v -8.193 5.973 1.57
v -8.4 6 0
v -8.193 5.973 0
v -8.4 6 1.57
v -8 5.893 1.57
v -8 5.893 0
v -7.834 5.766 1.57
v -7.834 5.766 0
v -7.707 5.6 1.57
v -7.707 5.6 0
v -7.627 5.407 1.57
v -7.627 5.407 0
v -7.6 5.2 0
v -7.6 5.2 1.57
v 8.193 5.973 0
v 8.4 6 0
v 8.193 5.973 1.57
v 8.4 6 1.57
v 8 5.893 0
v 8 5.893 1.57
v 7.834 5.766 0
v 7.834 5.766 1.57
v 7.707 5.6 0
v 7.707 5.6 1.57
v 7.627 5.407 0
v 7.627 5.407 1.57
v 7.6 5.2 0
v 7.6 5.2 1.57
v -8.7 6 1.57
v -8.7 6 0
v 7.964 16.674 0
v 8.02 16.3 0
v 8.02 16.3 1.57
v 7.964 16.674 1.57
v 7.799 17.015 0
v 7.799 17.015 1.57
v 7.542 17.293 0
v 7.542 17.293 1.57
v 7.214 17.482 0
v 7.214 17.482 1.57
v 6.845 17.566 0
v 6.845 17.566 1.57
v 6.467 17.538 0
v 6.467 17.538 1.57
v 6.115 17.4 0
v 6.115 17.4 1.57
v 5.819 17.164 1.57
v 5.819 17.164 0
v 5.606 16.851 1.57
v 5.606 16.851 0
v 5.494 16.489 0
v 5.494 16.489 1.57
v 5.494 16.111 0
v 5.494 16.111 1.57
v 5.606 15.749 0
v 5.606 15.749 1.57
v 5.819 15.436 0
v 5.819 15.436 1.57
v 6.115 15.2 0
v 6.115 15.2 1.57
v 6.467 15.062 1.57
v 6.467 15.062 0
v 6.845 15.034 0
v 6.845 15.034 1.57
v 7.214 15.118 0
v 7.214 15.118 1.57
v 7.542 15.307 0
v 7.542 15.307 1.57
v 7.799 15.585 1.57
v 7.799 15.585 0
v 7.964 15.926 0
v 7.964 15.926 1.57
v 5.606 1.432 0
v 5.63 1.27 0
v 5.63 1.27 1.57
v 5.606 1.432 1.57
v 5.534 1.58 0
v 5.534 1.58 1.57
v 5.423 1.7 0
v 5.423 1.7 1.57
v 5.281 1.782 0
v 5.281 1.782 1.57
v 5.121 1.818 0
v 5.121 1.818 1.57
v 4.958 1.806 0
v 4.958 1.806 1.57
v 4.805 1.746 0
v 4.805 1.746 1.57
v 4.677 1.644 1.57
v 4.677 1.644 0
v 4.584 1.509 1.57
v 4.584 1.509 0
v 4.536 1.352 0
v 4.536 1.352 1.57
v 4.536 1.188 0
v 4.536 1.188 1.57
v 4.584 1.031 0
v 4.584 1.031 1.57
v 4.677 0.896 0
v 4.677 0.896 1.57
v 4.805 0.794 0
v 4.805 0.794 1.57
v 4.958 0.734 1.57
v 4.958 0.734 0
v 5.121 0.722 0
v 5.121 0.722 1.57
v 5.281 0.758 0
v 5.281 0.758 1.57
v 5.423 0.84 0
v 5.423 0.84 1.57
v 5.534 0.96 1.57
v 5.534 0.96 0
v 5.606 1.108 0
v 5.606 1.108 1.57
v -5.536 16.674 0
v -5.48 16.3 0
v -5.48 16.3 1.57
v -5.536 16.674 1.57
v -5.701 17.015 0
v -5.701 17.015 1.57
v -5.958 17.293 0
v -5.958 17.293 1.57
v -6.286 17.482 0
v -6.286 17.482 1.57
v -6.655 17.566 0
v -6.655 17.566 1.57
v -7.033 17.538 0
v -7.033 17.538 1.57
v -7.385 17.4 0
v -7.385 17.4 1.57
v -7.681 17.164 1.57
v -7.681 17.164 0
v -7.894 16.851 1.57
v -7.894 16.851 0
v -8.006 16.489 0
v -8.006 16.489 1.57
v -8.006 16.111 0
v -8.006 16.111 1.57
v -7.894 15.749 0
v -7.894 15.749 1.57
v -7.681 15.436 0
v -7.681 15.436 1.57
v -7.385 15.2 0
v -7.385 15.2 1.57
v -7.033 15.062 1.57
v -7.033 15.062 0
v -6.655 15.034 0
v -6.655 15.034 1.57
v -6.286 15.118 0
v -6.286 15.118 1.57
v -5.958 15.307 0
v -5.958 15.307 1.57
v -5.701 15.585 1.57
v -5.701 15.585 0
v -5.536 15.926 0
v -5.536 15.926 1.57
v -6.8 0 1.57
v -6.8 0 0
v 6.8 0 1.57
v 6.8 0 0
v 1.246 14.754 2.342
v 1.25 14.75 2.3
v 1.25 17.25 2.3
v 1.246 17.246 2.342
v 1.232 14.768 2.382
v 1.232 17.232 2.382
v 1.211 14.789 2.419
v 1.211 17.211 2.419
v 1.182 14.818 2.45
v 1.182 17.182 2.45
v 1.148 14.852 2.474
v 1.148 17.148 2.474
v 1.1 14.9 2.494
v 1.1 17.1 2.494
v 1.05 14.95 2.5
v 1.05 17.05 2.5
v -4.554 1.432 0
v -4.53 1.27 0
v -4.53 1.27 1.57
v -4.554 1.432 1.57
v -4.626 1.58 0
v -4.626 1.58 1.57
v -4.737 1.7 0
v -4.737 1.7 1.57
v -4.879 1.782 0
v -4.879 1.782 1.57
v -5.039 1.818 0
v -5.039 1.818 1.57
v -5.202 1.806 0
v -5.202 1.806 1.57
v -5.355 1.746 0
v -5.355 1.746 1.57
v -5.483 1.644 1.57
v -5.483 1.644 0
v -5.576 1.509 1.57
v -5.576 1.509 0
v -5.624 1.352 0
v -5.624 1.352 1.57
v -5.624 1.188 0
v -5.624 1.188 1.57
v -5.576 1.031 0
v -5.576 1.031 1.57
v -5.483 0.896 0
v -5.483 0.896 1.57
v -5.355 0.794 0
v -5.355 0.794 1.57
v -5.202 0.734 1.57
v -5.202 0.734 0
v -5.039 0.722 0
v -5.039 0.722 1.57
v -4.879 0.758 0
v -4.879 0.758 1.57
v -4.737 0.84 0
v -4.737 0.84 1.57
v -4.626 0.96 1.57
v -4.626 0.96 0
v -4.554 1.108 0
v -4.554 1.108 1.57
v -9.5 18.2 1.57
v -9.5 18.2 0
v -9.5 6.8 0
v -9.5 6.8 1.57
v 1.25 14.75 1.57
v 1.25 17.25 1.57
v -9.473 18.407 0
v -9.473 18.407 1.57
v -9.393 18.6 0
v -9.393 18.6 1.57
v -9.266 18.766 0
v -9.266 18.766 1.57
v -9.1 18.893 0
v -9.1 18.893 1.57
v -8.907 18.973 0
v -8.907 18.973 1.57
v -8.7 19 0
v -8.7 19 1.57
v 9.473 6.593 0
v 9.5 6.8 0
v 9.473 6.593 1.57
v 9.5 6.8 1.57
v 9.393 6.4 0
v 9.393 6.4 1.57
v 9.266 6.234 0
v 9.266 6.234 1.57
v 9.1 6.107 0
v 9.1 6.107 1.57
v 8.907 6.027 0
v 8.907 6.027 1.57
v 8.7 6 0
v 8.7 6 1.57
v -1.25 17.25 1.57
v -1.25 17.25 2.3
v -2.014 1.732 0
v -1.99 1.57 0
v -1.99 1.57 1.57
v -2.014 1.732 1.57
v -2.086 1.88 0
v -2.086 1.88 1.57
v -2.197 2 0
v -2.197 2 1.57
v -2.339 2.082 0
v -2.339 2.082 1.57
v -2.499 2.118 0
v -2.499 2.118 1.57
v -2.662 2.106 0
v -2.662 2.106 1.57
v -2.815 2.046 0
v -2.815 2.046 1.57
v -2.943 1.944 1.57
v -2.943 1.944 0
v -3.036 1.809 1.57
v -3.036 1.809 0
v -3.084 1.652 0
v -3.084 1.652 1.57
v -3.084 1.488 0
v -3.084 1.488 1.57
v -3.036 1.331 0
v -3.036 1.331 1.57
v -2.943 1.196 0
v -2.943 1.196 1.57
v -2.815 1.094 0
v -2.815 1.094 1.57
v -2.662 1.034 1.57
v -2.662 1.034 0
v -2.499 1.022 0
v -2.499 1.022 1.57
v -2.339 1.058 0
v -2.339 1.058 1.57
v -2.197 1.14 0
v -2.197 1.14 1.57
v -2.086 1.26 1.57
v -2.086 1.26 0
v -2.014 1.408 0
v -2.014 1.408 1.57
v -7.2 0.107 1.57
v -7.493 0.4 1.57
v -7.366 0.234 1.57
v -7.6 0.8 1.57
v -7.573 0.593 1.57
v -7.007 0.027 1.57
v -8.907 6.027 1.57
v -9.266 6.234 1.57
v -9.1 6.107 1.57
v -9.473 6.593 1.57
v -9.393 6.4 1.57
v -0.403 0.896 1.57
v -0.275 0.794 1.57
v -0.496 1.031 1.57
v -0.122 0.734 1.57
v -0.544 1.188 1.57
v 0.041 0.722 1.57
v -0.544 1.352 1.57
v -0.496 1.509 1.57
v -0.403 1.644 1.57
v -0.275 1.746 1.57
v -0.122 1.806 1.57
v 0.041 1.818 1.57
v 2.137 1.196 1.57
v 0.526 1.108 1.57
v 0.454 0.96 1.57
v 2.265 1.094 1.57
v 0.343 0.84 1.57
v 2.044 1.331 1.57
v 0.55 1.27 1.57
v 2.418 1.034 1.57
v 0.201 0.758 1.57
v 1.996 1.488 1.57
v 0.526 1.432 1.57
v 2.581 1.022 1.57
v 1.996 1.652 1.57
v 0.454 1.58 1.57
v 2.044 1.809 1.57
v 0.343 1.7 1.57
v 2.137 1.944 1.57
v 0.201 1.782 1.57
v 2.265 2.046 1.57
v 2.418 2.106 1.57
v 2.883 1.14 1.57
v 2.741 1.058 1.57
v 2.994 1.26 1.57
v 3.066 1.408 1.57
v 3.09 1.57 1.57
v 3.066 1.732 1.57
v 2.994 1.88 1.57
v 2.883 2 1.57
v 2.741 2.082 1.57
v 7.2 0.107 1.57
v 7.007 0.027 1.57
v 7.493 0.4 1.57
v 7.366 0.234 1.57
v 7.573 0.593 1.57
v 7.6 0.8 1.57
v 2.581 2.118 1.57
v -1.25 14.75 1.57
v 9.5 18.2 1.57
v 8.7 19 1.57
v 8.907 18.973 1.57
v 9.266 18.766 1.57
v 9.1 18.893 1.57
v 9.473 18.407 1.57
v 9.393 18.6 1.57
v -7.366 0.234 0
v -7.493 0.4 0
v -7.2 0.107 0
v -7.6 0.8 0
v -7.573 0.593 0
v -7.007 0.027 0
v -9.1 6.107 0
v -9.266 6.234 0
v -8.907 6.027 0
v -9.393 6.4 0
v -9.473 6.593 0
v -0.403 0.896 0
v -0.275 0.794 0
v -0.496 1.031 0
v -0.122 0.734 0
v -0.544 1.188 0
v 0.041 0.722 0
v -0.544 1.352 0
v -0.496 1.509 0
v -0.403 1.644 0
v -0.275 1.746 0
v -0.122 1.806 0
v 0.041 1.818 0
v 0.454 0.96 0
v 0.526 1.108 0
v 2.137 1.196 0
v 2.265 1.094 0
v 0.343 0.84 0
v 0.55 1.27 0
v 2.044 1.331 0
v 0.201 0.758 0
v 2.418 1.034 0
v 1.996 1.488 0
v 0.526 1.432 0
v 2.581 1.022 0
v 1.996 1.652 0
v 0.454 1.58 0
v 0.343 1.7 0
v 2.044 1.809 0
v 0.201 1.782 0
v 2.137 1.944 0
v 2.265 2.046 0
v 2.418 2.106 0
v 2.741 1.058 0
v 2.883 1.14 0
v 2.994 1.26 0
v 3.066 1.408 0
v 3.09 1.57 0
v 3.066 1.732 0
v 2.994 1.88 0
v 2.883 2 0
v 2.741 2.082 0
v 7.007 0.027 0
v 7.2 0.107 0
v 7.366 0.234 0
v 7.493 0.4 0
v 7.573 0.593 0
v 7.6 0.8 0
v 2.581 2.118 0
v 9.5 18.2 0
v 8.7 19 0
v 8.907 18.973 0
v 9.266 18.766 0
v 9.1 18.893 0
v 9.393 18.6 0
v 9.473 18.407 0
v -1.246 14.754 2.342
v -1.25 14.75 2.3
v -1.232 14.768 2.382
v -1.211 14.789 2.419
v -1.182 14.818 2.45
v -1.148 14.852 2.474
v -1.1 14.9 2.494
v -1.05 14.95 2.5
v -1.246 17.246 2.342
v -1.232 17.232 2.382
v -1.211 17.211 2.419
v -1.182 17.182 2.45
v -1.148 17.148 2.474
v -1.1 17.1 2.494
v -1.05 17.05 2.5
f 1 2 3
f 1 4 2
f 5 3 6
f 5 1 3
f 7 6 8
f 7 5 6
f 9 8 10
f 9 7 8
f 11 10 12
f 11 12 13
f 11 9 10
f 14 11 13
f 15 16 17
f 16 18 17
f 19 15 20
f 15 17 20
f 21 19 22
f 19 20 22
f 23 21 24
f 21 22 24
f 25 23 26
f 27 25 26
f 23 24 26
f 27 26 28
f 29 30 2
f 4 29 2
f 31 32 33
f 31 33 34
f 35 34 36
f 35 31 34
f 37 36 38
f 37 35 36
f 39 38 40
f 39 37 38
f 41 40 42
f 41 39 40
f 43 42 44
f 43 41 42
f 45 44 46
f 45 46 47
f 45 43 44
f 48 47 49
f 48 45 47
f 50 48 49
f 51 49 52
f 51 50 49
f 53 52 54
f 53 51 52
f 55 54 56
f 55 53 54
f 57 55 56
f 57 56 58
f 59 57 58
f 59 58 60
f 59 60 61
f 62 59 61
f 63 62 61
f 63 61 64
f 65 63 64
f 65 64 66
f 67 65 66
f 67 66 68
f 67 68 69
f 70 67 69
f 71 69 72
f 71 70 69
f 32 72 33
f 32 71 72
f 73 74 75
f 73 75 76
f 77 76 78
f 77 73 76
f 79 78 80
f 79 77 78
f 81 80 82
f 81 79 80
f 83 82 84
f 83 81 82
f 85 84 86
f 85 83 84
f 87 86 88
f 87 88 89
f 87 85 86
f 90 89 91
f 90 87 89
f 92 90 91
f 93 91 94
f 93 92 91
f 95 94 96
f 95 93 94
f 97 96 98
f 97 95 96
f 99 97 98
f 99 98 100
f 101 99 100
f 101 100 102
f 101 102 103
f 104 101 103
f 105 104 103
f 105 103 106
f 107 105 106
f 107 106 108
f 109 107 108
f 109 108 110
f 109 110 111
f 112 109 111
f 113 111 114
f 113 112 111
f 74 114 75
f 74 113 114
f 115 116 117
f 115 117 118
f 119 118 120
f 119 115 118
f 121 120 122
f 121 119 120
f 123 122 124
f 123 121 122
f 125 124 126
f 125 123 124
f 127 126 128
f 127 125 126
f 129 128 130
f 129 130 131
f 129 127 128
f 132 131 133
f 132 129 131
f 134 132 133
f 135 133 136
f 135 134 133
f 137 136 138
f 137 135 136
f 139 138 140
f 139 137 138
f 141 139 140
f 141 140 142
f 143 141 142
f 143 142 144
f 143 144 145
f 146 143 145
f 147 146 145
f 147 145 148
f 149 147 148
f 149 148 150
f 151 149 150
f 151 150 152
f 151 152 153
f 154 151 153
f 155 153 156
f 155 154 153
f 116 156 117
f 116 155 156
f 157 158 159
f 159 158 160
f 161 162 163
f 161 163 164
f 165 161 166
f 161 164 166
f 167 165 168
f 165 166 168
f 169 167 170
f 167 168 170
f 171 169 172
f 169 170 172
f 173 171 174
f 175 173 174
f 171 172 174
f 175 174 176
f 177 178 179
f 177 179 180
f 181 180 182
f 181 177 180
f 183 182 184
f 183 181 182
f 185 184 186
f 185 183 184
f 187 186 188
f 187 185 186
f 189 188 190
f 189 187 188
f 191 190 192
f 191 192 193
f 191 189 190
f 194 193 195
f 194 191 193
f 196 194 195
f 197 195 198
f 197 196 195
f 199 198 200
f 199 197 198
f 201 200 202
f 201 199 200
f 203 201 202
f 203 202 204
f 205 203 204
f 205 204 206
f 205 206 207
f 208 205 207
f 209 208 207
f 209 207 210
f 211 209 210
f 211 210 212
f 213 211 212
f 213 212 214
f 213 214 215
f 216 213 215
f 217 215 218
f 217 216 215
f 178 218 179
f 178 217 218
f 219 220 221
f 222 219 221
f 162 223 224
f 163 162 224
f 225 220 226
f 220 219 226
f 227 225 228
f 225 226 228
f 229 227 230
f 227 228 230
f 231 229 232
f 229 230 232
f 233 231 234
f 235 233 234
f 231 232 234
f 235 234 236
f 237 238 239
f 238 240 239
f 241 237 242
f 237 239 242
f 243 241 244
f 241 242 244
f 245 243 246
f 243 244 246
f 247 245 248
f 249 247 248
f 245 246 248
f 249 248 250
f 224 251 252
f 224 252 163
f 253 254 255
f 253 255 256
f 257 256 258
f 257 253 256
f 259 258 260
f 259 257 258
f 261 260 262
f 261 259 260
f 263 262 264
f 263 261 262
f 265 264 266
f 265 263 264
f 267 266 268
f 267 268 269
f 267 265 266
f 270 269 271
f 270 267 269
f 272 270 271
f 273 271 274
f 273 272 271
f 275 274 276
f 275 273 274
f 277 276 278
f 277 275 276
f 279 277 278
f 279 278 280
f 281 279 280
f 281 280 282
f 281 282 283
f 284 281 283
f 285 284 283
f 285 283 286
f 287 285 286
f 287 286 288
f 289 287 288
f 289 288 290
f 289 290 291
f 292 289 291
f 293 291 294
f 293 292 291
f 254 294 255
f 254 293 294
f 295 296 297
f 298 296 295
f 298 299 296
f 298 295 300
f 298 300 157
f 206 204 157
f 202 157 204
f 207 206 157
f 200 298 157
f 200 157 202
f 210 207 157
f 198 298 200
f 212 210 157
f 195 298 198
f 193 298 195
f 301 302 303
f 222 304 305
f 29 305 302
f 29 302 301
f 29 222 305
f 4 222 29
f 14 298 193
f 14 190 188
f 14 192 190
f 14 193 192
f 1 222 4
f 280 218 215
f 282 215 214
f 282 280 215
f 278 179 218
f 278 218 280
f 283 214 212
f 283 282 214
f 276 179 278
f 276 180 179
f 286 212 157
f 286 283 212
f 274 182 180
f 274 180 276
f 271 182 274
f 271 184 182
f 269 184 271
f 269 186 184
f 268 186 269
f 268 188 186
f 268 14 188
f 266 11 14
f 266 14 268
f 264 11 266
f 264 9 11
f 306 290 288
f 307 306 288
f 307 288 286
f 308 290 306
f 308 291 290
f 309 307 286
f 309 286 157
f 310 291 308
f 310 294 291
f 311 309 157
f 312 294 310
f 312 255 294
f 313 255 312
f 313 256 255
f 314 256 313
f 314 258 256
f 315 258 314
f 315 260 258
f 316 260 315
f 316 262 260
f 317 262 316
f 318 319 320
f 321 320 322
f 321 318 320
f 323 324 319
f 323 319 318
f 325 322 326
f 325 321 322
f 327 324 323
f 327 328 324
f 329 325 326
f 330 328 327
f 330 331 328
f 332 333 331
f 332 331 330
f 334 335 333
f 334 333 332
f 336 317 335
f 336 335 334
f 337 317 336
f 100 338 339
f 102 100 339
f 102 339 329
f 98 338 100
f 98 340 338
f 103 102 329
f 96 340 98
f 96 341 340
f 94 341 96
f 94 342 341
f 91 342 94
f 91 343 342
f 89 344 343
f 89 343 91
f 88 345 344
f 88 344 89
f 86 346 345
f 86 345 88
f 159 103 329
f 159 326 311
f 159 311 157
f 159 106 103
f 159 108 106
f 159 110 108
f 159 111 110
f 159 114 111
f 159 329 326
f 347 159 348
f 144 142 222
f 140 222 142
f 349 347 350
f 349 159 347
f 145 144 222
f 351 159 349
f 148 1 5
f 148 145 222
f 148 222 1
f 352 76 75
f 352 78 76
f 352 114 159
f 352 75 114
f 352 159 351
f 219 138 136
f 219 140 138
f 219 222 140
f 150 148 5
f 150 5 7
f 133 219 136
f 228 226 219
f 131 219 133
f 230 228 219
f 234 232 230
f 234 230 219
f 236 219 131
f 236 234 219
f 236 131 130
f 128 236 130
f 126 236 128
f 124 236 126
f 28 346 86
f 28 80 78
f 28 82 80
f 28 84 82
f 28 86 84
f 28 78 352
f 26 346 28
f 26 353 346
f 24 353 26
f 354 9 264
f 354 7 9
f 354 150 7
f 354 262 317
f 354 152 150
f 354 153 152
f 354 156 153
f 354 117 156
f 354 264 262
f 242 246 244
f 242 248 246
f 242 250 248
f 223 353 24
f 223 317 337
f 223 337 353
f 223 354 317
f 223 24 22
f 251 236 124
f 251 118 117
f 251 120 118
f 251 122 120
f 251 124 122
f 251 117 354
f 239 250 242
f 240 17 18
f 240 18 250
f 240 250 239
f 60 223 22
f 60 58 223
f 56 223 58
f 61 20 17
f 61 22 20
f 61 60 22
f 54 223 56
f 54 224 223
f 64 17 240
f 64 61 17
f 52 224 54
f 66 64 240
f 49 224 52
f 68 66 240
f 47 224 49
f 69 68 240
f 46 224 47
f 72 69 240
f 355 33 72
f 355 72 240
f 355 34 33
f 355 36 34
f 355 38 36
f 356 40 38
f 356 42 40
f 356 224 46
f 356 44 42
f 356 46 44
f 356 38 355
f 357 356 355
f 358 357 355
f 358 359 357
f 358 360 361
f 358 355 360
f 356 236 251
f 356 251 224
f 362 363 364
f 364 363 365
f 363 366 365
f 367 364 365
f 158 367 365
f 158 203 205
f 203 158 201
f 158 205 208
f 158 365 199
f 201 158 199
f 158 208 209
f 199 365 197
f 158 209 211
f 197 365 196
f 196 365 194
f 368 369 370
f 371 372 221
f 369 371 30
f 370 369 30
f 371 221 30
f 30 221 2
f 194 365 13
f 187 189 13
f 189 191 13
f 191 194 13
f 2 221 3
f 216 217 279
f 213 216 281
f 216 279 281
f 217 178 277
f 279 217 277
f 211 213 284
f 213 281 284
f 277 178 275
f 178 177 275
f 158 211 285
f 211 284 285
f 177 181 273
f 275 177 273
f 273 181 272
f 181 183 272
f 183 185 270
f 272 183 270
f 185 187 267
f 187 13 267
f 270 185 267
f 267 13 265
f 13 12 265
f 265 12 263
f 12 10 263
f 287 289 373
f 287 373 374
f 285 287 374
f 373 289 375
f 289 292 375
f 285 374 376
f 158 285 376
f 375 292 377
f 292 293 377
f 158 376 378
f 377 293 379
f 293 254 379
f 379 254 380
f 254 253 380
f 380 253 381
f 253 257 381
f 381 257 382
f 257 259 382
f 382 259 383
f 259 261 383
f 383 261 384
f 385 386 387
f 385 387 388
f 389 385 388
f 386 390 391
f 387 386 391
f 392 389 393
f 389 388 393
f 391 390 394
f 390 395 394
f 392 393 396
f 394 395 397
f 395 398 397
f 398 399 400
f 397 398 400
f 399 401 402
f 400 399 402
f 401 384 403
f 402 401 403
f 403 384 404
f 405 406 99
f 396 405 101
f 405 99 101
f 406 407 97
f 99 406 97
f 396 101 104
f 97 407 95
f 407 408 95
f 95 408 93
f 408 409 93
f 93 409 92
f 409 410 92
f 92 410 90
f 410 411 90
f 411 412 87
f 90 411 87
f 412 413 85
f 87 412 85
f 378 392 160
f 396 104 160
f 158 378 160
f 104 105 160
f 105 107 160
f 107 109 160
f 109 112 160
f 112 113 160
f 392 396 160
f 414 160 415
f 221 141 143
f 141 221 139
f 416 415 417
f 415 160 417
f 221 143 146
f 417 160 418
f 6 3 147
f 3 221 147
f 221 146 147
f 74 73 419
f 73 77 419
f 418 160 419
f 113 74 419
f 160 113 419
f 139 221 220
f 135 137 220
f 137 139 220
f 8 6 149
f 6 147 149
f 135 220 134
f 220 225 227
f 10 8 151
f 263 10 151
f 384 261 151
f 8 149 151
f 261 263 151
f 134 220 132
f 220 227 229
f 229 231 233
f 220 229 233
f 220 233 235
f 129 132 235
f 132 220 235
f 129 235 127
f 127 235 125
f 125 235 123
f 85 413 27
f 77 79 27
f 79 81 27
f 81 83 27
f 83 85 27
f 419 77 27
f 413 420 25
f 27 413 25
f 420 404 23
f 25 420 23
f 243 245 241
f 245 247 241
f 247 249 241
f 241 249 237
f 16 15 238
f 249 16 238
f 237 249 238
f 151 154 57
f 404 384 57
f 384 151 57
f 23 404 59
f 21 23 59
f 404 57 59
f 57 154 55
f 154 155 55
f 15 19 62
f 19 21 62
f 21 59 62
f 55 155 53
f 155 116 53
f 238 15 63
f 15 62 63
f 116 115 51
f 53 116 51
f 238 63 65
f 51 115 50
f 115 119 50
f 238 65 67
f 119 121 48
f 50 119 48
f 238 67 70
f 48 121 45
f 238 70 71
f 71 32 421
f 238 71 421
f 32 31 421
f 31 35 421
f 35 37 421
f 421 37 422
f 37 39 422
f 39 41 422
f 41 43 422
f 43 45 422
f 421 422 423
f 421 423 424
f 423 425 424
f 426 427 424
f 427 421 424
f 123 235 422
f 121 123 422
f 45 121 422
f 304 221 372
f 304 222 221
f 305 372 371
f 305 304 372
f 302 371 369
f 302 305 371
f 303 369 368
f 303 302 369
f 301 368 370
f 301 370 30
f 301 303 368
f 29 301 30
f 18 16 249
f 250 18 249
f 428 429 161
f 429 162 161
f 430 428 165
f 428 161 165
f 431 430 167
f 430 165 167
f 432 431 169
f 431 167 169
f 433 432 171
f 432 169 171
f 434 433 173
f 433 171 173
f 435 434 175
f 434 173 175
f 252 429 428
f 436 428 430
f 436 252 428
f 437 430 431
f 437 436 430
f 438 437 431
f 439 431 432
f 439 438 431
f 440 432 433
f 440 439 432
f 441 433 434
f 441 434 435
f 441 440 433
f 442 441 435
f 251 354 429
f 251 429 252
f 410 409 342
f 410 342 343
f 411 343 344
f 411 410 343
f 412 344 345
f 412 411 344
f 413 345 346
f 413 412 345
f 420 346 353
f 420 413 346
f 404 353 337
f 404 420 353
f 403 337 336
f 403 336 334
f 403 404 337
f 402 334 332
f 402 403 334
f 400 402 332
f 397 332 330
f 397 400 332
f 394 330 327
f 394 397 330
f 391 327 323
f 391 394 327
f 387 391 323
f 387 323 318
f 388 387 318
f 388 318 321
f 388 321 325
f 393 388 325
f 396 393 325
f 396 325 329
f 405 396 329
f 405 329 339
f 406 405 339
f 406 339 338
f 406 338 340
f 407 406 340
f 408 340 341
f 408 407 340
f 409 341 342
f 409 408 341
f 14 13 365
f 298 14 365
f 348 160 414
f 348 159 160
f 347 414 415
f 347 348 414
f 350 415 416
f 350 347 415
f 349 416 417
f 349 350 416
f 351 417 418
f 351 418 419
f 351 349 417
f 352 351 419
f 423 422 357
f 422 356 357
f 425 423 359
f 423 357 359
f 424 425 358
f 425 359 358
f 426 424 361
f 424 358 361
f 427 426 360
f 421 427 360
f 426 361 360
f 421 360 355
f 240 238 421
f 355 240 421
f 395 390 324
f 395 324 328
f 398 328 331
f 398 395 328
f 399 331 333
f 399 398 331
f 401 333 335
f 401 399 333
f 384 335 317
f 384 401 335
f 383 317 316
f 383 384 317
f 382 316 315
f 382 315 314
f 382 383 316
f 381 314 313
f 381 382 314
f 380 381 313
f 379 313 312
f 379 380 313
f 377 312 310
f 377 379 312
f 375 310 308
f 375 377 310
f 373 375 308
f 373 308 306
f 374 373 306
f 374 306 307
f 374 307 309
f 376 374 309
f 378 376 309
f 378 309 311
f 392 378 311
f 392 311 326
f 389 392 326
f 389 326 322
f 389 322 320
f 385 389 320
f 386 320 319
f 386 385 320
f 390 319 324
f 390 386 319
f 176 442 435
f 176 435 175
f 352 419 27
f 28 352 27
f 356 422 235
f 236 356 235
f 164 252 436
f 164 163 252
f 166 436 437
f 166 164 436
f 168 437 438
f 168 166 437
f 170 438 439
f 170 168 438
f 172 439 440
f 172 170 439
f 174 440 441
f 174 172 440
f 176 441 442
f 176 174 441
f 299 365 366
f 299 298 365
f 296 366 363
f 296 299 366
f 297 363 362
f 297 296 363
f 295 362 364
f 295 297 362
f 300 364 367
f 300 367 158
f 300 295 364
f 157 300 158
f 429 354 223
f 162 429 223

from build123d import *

# Parameters (mm, degrees)
SKETCH1_R           = 1.27
SKETCH1_R_2         = 0.55
BOSS_EXTRUDE1_DEPTH = 1.57
FILLET1_R           = 0.8
SKETCH2_W           = 2.5
SKETCH2_H           = 2.5
BOSS_EXTRUDE2_DEPTH = 0.93
FILLET2_R           = 0.2


with BuildPart() as part:
    # Sketch1 → Boss-Extrude1 (new body)
    with BuildSketch(Plane.XY):
        Polygon((-9.5, 19), (-9.5, 6), (-7.6, 6), (-7.6, 0), (7.6, 0), (7.6, 6), (9.5, 6), (9.5, 19), align=None)
        with Locations((-6.75, 16.3)):
            Circle(SKETCH1_R, mode=Mode.SUBTRACT)
        with Locations((6.75, 16.3)):
            Circle(SKETCH1_R, mode=Mode.SUBTRACT)
        with Locations((0, 1.27)):
            Circle(SKETCH1_R_2, mode=Mode.SUBTRACT)
        with Locations((-5.08, 1.27)):
            Circle(SKETCH1_R_2, mode=Mode.SUBTRACT)
        with Locations((5.08, 1.27)):
            Circle(SKETCH1_R_2, mode=Mode.SUBTRACT)
        with Locations((-2.54, 1.57)):
            Circle(SKETCH1_R_2, mode=Mode.SUBTRACT)
        with Locations((2.54, 1.57)):
            Circle(SKETCH1_R_2, mode=Mode.SUBTRACT)
    extrude(amount=BOSS_EXTRUDE1_DEPTH)

    # Fillet1
    fillet1_edges = [part.edges().sort_by_distance(p)[0] for p in [
        (9.5, 6, 0.785),
        (7.6, 6, 0.785),
        (7.6, 0, 0.785),
        (-7.6, 0, 0.785),
        (-7.6, 6, 0.785),
        (-9.5, 6, 0.785),
        (-9.5, 19, 0.785),
        (9.5, 19, 0.785),
    ]]
    fillet(fillet1_edges, radius=FILLET1_R)

    # Sketch2 → Boss-Extrude2 (add)
    with BuildSketch(Plane.XY.offset(1.57)):
        with Locations((0, 16)):
            Rectangle(SKETCH2_W, SKETCH2_H)
    extrude(amount=BOSS_EXTRUDE2_DEPTH)

    # Fillet2
    fillet2_edges = [part.edges().sort_by_distance(p)[0] for p in [
        (1.25, 16, 2.5),
        (0, 17.25, 2.5),
        (-1.25, 16, 2.5),
        (0, 14.75, 2.5),
    ]]
    fillet(fillet2_edges, radius=FILLET2_R)


solid = part.part
